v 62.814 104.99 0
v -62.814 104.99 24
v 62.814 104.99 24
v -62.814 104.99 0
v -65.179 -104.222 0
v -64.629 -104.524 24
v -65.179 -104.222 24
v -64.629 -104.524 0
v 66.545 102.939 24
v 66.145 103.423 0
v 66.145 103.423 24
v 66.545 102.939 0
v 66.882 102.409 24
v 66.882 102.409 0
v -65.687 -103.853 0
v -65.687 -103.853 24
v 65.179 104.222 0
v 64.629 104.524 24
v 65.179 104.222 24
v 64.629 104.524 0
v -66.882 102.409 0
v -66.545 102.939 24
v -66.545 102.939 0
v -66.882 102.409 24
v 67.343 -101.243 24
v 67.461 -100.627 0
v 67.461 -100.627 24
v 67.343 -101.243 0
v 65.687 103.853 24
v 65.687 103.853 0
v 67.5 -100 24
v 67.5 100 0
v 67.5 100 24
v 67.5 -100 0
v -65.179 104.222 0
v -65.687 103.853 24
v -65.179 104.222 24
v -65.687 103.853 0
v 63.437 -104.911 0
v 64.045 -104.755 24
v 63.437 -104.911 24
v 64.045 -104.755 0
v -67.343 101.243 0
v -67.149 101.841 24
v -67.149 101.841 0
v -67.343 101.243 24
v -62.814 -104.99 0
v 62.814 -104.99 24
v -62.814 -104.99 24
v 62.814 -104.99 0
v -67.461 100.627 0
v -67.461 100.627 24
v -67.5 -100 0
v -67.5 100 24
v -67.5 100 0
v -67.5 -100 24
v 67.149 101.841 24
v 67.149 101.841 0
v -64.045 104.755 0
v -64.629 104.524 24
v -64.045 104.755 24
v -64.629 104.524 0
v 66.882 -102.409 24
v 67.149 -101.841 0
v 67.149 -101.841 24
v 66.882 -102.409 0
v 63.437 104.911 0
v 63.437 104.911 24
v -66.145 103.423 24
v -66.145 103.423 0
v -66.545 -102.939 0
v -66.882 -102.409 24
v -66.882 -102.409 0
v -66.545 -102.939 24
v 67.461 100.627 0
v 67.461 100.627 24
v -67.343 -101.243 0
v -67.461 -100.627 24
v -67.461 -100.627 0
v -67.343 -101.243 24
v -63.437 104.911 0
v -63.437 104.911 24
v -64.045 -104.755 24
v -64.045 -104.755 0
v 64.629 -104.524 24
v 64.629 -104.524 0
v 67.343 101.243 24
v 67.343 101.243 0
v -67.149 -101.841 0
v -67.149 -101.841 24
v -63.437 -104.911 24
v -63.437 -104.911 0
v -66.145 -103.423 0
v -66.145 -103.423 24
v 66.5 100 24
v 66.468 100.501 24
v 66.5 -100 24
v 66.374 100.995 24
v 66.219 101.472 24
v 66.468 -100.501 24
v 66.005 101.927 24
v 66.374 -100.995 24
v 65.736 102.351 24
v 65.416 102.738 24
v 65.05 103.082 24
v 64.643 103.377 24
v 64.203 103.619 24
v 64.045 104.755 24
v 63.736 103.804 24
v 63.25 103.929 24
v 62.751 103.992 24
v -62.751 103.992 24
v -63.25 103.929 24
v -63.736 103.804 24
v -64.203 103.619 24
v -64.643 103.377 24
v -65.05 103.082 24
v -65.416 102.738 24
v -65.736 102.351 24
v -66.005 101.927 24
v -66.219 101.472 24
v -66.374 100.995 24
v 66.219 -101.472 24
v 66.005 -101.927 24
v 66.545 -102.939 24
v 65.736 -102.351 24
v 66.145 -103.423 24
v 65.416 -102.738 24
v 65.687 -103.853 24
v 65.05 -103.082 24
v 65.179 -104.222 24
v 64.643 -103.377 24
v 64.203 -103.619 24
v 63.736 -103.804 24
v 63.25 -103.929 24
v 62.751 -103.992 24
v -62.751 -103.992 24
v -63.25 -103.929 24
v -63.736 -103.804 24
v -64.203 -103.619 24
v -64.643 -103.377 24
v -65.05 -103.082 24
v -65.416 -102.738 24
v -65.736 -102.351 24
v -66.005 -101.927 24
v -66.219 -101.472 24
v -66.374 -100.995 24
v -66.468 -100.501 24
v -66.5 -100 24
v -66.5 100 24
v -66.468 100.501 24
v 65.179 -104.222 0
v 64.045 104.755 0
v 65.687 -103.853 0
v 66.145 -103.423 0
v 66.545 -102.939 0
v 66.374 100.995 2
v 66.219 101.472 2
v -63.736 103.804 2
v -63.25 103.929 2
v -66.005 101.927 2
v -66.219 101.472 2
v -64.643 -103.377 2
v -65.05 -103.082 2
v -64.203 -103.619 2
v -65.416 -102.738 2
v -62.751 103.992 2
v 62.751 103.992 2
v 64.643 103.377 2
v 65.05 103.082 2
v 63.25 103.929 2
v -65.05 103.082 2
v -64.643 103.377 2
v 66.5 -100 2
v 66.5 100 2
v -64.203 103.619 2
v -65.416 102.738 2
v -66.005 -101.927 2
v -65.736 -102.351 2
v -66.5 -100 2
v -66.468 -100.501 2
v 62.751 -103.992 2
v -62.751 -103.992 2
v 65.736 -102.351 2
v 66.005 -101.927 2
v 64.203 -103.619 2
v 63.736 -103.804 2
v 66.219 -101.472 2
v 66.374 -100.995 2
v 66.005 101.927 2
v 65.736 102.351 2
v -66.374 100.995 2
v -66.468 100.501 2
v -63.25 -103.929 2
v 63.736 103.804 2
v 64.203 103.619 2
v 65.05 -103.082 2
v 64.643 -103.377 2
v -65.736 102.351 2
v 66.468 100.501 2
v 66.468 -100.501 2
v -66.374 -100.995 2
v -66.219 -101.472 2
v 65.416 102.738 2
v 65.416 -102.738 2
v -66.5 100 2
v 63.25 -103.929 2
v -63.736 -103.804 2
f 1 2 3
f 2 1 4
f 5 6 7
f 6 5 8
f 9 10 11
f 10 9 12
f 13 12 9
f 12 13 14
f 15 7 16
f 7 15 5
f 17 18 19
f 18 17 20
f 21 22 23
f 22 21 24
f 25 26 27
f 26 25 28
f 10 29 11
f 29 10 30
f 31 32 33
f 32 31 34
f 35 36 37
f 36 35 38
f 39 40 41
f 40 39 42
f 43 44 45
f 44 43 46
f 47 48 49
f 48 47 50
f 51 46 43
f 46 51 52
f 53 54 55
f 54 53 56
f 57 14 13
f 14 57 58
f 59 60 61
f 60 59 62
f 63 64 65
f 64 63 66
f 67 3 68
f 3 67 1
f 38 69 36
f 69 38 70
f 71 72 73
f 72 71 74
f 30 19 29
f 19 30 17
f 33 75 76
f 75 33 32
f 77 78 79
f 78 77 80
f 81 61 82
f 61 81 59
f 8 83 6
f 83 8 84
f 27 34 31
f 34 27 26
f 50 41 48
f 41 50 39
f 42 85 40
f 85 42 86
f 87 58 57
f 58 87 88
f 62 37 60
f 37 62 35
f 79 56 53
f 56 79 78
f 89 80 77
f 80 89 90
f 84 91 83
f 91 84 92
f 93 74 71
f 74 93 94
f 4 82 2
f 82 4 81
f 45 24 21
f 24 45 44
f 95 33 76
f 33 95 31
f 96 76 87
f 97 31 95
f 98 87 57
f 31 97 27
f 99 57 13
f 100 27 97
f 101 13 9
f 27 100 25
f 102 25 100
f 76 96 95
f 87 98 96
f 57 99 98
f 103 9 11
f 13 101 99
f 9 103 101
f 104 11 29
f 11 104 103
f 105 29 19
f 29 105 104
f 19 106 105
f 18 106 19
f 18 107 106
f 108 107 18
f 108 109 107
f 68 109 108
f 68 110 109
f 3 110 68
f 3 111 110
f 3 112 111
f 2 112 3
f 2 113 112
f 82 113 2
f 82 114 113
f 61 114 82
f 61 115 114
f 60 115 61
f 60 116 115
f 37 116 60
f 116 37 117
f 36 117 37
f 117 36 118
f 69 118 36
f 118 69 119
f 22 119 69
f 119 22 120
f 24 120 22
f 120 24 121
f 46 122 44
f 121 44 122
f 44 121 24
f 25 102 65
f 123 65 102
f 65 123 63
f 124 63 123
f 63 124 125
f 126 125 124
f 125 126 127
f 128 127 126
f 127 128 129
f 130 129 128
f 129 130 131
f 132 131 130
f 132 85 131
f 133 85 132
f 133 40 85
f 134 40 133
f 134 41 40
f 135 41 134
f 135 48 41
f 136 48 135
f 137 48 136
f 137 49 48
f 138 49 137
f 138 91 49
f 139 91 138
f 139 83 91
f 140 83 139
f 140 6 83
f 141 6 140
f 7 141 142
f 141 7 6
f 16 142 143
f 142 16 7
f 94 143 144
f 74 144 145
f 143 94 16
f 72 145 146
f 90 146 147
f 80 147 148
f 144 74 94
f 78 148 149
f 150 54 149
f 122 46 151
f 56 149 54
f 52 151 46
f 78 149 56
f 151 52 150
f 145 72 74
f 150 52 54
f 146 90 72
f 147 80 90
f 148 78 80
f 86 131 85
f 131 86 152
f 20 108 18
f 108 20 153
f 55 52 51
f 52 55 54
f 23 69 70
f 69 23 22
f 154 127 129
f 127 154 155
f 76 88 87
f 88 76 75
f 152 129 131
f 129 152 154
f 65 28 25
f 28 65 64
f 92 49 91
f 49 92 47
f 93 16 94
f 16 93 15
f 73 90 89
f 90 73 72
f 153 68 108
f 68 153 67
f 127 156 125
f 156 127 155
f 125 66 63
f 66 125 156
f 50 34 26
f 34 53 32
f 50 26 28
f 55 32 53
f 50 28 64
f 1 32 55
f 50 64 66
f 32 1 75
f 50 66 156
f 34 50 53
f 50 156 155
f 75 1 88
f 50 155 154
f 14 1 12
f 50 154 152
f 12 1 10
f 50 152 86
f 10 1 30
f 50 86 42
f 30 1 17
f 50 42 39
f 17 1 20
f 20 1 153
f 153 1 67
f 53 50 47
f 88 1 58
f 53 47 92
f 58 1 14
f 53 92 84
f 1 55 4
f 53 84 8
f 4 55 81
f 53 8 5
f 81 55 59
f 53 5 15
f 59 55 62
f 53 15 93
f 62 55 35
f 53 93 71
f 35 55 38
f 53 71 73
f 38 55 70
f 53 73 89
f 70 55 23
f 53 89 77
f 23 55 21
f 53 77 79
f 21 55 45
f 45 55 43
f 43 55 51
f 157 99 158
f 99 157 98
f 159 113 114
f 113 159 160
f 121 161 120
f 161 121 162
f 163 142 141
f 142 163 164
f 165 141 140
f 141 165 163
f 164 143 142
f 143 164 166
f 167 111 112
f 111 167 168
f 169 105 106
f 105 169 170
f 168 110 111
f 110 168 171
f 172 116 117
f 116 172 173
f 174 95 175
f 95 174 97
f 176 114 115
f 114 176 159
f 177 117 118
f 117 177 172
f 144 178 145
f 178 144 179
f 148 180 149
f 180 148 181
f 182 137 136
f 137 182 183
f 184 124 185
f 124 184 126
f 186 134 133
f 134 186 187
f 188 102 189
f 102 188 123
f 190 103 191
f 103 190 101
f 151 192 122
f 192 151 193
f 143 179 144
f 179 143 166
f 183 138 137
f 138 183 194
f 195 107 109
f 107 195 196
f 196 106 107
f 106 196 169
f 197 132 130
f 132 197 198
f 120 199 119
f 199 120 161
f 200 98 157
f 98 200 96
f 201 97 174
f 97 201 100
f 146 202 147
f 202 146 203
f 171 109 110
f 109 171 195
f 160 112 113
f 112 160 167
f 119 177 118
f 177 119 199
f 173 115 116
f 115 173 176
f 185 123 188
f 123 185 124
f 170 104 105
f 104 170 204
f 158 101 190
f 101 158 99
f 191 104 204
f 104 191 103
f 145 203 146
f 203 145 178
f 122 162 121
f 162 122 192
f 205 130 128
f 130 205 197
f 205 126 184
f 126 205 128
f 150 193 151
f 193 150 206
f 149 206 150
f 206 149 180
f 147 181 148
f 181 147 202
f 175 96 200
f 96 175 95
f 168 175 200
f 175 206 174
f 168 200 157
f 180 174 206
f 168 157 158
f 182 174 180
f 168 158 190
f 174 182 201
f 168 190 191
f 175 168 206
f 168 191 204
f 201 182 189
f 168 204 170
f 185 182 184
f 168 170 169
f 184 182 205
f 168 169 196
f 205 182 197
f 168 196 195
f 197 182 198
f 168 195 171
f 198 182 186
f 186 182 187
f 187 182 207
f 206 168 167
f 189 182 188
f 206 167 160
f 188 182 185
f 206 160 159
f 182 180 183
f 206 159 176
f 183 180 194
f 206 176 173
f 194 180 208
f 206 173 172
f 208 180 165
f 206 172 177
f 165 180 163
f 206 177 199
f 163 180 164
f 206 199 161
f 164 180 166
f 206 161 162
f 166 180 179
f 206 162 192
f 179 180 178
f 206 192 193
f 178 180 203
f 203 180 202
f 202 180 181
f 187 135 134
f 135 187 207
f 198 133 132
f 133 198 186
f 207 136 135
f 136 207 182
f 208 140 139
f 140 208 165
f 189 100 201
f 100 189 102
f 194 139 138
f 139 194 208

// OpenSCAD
$fn = 50;


difference() {
	union() {
		hull() {
			translate(v = [-62.5000000000, 100.0000000000, 0]) {
				cylinder(h = 24, r = 5);
			}
			translate(v = [62.5000000000, 100.0000000000, 0]) {
				cylinder(h = 24, r = 5);
			}
			translate(v = [-62.5000000000, -100.0000000000, 0]) {
				cylinder(h = 24, r = 5);
			}
			translate(v = [62.5000000000, -100.0000000000, 0]) {
				cylinder(h = 24, r = 5);
			}
		}
	}
	union() {
		translate(v = [0, 0, 2]) {
			hull() {
				translate(v = [-62.5000000000, 100.0000000000, 0]) {
					cylinder(h = 22, r = 4);
				}
				translate(v = [62.5000000000, 100.0000000000, 0]) {
					cylinder(h = 22, r = 4);
				}
				translate(v = [-62.5000000000, -100.0000000000, 0]) {
					cylinder(h = 22, r = 4);
				}
				translate(v = [62.5000000000, -100.0000000000, 0]) {
					cylinder(h = 22, r = 4);
				}
			}
		}
	}
}
